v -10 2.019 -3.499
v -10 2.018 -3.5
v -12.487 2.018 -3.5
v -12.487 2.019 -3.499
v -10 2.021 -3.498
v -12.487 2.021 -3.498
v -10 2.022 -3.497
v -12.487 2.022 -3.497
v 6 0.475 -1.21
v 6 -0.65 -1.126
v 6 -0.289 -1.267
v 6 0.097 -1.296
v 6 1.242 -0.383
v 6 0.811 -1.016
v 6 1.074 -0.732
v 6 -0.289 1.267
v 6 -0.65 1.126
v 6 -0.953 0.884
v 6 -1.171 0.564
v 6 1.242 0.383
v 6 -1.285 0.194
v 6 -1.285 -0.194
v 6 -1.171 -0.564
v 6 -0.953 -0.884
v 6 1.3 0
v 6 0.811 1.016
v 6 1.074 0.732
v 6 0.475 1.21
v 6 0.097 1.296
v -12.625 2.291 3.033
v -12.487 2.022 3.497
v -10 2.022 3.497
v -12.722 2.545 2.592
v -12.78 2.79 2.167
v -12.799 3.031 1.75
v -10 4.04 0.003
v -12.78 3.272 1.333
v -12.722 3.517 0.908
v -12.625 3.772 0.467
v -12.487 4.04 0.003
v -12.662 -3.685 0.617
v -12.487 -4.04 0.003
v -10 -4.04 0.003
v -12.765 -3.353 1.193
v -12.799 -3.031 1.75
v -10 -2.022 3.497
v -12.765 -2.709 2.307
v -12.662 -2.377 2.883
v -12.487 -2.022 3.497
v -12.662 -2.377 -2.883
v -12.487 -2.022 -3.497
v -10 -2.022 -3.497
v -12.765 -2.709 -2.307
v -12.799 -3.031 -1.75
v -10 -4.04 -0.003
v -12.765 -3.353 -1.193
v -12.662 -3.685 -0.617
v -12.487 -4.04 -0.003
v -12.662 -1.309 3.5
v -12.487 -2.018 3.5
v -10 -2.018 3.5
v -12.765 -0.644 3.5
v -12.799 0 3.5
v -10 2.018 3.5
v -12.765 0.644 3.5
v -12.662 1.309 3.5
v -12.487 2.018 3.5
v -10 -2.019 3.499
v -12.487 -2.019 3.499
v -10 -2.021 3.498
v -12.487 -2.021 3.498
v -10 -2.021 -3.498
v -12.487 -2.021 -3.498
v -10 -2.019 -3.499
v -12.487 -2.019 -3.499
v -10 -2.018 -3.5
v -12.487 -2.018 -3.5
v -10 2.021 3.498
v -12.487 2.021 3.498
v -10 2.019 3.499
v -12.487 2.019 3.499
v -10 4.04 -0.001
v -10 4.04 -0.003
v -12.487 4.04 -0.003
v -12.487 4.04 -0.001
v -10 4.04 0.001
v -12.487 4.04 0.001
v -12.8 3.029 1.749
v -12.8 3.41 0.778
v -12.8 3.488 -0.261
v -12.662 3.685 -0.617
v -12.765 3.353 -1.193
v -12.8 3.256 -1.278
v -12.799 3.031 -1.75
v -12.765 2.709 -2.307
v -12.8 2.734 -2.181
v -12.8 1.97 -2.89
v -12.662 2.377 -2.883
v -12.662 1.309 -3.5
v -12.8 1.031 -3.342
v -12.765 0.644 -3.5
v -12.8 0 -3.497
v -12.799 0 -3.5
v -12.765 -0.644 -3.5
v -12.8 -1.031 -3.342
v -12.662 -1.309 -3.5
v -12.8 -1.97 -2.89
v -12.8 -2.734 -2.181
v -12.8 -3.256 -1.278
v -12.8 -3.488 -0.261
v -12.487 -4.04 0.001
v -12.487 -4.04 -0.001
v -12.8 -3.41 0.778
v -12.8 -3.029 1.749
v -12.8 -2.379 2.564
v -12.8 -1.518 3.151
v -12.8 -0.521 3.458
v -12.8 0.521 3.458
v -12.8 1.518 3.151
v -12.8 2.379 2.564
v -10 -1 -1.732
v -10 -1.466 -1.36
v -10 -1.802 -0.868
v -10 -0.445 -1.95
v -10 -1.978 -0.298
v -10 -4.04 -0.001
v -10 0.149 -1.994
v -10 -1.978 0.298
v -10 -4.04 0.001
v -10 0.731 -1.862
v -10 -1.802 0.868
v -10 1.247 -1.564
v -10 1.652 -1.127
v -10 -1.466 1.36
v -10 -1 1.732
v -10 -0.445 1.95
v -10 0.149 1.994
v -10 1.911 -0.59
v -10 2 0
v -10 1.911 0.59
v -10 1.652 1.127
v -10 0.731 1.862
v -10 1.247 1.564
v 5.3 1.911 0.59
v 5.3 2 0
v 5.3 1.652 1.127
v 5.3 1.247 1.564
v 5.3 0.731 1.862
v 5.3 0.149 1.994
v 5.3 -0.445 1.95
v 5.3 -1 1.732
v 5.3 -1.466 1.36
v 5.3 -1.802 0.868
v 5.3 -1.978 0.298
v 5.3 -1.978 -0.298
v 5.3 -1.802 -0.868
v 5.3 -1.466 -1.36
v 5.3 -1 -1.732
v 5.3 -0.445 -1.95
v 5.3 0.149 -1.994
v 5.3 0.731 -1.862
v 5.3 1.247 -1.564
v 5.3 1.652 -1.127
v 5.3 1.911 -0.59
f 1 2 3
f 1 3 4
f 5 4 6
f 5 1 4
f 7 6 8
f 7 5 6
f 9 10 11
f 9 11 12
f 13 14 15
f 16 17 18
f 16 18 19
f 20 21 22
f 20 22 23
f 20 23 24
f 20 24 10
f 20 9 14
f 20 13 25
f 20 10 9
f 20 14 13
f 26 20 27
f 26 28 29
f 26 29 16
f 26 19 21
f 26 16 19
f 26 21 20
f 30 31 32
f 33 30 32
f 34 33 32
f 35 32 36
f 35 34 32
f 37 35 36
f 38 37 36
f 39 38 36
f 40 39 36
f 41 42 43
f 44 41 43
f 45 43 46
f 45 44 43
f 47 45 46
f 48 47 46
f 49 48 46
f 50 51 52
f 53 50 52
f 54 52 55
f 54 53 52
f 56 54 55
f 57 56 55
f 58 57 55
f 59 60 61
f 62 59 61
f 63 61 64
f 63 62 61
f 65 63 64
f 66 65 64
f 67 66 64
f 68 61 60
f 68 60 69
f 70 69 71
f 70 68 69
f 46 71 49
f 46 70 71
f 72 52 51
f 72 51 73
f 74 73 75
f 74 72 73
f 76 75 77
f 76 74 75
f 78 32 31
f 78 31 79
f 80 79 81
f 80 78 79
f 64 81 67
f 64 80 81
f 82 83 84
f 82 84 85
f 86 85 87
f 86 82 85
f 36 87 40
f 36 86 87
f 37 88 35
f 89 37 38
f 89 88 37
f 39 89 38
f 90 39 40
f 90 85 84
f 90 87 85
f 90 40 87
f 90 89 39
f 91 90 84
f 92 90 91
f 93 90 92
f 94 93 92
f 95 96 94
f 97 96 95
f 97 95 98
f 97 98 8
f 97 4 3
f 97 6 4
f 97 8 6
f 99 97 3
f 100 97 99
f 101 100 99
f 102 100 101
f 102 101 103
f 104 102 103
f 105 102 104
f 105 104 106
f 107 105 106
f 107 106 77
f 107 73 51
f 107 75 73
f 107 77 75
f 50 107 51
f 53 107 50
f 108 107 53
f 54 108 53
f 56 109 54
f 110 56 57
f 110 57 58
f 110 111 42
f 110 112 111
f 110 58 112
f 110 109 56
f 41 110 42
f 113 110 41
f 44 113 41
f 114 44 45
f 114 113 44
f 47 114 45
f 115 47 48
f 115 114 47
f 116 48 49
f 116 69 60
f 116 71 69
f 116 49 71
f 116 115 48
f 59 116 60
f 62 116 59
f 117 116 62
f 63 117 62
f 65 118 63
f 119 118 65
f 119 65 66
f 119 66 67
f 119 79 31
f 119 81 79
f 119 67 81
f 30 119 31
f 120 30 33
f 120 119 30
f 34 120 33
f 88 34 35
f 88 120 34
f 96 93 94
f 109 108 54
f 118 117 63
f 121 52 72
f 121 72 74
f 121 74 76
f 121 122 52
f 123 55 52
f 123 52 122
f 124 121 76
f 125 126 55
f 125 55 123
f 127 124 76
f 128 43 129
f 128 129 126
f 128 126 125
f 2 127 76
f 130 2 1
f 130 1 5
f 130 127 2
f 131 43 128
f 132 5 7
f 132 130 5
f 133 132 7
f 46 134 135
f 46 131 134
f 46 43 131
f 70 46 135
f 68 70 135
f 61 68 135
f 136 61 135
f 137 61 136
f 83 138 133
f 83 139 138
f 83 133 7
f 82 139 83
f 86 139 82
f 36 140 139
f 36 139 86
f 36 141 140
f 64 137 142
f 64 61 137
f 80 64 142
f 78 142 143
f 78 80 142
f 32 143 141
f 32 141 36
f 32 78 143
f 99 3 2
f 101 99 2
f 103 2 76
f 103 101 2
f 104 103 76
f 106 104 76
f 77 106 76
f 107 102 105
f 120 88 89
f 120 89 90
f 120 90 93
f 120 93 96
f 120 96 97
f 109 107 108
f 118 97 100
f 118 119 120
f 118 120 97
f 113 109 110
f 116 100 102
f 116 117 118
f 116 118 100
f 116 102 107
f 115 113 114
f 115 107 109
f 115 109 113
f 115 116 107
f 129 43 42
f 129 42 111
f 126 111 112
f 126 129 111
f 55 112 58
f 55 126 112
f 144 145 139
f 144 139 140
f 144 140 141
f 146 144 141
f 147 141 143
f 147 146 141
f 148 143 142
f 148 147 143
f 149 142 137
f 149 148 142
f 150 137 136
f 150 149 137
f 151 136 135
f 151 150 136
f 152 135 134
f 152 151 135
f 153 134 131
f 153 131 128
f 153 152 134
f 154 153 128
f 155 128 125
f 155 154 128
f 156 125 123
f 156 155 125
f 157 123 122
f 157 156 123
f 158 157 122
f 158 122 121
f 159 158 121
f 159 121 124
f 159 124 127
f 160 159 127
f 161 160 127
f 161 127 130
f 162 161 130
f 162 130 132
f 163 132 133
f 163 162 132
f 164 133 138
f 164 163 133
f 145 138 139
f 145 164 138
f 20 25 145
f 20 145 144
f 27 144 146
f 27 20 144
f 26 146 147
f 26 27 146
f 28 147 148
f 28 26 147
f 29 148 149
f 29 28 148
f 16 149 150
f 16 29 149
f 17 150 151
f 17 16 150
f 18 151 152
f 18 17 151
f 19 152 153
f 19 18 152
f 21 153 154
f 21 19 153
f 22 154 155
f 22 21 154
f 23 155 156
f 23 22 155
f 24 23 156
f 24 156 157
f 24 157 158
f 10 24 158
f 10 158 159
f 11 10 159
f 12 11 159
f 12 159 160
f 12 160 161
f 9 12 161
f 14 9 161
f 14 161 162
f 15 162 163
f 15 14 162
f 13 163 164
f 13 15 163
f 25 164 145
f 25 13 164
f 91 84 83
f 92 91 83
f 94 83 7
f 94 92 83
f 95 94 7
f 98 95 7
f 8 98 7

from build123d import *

# Parameters (mm, degrees)
SKETCH_2_OUTSIDE_W  = 14.48
SKETCH_2_OUTSIDE_H  = 14.48
CUT_EXTRUDE_1_DEPTH = 18.8
CHAMFER_1_SIZE      = 0.7


with BuildPart() as part:
    # Эскиз1 → Повернуть1 (revolve)
    with BuildSketch(Plane.XY):
        Polygon((-12.8, 0), (-12.8, 4.04), (-10, 4.04), (-10, 2), (6, 2), (6, 0), align=None)
    revolve(axis=Axis((-21.700276243, 0, 0), (1, 0, 0)))

    # Эскиз2 outside → Вырез-Вытянуть1 (cut)
    with BuildSketch(Plane.ZY.offset(12.8)):
        Rectangle(SKETCH_2_OUTSIDE_W, SKETCH_2_OUTSIDE_H)
        Polygon((0, 4.041451884), (-3.5, 2.020725942), (-3.5, -2.020725942), (0, -4.041451884), (3.5, -2.020725942), (3.5, 2.020725942), align=None, mode=Mode.SUBTRACT)
    extrude(amount=-CUT_EXTRUDE_1_DEPTH, mode=Mode.SUBTRACT)

    # Фаска1
    chamfer_1_edges = [part.edges().sort_by_distance(p)[0] for p in [
        (6, -2, 0),
    ]]
    chamfer(chamfer_1_edges, length=CHAMFER_1_SIZE)

    # Эскиз5 → Вырез-Повернуть1 (revolve, cut)
    with BuildSketch(Plane(origin=(0, 0, 0), x_dir=(-1, 0, 0), z_dir=(0, 0.5, -0.866025404))):
        Polygon((12.8, 3.497483906), (12.8, 6.497483906), (11.067949192, 6.497483906), align=None)
    revolve(axis=Axis((0, 0, 0), (-1, 0, 0)), mode=Mode.SUBTRACT)


solid = part.part
